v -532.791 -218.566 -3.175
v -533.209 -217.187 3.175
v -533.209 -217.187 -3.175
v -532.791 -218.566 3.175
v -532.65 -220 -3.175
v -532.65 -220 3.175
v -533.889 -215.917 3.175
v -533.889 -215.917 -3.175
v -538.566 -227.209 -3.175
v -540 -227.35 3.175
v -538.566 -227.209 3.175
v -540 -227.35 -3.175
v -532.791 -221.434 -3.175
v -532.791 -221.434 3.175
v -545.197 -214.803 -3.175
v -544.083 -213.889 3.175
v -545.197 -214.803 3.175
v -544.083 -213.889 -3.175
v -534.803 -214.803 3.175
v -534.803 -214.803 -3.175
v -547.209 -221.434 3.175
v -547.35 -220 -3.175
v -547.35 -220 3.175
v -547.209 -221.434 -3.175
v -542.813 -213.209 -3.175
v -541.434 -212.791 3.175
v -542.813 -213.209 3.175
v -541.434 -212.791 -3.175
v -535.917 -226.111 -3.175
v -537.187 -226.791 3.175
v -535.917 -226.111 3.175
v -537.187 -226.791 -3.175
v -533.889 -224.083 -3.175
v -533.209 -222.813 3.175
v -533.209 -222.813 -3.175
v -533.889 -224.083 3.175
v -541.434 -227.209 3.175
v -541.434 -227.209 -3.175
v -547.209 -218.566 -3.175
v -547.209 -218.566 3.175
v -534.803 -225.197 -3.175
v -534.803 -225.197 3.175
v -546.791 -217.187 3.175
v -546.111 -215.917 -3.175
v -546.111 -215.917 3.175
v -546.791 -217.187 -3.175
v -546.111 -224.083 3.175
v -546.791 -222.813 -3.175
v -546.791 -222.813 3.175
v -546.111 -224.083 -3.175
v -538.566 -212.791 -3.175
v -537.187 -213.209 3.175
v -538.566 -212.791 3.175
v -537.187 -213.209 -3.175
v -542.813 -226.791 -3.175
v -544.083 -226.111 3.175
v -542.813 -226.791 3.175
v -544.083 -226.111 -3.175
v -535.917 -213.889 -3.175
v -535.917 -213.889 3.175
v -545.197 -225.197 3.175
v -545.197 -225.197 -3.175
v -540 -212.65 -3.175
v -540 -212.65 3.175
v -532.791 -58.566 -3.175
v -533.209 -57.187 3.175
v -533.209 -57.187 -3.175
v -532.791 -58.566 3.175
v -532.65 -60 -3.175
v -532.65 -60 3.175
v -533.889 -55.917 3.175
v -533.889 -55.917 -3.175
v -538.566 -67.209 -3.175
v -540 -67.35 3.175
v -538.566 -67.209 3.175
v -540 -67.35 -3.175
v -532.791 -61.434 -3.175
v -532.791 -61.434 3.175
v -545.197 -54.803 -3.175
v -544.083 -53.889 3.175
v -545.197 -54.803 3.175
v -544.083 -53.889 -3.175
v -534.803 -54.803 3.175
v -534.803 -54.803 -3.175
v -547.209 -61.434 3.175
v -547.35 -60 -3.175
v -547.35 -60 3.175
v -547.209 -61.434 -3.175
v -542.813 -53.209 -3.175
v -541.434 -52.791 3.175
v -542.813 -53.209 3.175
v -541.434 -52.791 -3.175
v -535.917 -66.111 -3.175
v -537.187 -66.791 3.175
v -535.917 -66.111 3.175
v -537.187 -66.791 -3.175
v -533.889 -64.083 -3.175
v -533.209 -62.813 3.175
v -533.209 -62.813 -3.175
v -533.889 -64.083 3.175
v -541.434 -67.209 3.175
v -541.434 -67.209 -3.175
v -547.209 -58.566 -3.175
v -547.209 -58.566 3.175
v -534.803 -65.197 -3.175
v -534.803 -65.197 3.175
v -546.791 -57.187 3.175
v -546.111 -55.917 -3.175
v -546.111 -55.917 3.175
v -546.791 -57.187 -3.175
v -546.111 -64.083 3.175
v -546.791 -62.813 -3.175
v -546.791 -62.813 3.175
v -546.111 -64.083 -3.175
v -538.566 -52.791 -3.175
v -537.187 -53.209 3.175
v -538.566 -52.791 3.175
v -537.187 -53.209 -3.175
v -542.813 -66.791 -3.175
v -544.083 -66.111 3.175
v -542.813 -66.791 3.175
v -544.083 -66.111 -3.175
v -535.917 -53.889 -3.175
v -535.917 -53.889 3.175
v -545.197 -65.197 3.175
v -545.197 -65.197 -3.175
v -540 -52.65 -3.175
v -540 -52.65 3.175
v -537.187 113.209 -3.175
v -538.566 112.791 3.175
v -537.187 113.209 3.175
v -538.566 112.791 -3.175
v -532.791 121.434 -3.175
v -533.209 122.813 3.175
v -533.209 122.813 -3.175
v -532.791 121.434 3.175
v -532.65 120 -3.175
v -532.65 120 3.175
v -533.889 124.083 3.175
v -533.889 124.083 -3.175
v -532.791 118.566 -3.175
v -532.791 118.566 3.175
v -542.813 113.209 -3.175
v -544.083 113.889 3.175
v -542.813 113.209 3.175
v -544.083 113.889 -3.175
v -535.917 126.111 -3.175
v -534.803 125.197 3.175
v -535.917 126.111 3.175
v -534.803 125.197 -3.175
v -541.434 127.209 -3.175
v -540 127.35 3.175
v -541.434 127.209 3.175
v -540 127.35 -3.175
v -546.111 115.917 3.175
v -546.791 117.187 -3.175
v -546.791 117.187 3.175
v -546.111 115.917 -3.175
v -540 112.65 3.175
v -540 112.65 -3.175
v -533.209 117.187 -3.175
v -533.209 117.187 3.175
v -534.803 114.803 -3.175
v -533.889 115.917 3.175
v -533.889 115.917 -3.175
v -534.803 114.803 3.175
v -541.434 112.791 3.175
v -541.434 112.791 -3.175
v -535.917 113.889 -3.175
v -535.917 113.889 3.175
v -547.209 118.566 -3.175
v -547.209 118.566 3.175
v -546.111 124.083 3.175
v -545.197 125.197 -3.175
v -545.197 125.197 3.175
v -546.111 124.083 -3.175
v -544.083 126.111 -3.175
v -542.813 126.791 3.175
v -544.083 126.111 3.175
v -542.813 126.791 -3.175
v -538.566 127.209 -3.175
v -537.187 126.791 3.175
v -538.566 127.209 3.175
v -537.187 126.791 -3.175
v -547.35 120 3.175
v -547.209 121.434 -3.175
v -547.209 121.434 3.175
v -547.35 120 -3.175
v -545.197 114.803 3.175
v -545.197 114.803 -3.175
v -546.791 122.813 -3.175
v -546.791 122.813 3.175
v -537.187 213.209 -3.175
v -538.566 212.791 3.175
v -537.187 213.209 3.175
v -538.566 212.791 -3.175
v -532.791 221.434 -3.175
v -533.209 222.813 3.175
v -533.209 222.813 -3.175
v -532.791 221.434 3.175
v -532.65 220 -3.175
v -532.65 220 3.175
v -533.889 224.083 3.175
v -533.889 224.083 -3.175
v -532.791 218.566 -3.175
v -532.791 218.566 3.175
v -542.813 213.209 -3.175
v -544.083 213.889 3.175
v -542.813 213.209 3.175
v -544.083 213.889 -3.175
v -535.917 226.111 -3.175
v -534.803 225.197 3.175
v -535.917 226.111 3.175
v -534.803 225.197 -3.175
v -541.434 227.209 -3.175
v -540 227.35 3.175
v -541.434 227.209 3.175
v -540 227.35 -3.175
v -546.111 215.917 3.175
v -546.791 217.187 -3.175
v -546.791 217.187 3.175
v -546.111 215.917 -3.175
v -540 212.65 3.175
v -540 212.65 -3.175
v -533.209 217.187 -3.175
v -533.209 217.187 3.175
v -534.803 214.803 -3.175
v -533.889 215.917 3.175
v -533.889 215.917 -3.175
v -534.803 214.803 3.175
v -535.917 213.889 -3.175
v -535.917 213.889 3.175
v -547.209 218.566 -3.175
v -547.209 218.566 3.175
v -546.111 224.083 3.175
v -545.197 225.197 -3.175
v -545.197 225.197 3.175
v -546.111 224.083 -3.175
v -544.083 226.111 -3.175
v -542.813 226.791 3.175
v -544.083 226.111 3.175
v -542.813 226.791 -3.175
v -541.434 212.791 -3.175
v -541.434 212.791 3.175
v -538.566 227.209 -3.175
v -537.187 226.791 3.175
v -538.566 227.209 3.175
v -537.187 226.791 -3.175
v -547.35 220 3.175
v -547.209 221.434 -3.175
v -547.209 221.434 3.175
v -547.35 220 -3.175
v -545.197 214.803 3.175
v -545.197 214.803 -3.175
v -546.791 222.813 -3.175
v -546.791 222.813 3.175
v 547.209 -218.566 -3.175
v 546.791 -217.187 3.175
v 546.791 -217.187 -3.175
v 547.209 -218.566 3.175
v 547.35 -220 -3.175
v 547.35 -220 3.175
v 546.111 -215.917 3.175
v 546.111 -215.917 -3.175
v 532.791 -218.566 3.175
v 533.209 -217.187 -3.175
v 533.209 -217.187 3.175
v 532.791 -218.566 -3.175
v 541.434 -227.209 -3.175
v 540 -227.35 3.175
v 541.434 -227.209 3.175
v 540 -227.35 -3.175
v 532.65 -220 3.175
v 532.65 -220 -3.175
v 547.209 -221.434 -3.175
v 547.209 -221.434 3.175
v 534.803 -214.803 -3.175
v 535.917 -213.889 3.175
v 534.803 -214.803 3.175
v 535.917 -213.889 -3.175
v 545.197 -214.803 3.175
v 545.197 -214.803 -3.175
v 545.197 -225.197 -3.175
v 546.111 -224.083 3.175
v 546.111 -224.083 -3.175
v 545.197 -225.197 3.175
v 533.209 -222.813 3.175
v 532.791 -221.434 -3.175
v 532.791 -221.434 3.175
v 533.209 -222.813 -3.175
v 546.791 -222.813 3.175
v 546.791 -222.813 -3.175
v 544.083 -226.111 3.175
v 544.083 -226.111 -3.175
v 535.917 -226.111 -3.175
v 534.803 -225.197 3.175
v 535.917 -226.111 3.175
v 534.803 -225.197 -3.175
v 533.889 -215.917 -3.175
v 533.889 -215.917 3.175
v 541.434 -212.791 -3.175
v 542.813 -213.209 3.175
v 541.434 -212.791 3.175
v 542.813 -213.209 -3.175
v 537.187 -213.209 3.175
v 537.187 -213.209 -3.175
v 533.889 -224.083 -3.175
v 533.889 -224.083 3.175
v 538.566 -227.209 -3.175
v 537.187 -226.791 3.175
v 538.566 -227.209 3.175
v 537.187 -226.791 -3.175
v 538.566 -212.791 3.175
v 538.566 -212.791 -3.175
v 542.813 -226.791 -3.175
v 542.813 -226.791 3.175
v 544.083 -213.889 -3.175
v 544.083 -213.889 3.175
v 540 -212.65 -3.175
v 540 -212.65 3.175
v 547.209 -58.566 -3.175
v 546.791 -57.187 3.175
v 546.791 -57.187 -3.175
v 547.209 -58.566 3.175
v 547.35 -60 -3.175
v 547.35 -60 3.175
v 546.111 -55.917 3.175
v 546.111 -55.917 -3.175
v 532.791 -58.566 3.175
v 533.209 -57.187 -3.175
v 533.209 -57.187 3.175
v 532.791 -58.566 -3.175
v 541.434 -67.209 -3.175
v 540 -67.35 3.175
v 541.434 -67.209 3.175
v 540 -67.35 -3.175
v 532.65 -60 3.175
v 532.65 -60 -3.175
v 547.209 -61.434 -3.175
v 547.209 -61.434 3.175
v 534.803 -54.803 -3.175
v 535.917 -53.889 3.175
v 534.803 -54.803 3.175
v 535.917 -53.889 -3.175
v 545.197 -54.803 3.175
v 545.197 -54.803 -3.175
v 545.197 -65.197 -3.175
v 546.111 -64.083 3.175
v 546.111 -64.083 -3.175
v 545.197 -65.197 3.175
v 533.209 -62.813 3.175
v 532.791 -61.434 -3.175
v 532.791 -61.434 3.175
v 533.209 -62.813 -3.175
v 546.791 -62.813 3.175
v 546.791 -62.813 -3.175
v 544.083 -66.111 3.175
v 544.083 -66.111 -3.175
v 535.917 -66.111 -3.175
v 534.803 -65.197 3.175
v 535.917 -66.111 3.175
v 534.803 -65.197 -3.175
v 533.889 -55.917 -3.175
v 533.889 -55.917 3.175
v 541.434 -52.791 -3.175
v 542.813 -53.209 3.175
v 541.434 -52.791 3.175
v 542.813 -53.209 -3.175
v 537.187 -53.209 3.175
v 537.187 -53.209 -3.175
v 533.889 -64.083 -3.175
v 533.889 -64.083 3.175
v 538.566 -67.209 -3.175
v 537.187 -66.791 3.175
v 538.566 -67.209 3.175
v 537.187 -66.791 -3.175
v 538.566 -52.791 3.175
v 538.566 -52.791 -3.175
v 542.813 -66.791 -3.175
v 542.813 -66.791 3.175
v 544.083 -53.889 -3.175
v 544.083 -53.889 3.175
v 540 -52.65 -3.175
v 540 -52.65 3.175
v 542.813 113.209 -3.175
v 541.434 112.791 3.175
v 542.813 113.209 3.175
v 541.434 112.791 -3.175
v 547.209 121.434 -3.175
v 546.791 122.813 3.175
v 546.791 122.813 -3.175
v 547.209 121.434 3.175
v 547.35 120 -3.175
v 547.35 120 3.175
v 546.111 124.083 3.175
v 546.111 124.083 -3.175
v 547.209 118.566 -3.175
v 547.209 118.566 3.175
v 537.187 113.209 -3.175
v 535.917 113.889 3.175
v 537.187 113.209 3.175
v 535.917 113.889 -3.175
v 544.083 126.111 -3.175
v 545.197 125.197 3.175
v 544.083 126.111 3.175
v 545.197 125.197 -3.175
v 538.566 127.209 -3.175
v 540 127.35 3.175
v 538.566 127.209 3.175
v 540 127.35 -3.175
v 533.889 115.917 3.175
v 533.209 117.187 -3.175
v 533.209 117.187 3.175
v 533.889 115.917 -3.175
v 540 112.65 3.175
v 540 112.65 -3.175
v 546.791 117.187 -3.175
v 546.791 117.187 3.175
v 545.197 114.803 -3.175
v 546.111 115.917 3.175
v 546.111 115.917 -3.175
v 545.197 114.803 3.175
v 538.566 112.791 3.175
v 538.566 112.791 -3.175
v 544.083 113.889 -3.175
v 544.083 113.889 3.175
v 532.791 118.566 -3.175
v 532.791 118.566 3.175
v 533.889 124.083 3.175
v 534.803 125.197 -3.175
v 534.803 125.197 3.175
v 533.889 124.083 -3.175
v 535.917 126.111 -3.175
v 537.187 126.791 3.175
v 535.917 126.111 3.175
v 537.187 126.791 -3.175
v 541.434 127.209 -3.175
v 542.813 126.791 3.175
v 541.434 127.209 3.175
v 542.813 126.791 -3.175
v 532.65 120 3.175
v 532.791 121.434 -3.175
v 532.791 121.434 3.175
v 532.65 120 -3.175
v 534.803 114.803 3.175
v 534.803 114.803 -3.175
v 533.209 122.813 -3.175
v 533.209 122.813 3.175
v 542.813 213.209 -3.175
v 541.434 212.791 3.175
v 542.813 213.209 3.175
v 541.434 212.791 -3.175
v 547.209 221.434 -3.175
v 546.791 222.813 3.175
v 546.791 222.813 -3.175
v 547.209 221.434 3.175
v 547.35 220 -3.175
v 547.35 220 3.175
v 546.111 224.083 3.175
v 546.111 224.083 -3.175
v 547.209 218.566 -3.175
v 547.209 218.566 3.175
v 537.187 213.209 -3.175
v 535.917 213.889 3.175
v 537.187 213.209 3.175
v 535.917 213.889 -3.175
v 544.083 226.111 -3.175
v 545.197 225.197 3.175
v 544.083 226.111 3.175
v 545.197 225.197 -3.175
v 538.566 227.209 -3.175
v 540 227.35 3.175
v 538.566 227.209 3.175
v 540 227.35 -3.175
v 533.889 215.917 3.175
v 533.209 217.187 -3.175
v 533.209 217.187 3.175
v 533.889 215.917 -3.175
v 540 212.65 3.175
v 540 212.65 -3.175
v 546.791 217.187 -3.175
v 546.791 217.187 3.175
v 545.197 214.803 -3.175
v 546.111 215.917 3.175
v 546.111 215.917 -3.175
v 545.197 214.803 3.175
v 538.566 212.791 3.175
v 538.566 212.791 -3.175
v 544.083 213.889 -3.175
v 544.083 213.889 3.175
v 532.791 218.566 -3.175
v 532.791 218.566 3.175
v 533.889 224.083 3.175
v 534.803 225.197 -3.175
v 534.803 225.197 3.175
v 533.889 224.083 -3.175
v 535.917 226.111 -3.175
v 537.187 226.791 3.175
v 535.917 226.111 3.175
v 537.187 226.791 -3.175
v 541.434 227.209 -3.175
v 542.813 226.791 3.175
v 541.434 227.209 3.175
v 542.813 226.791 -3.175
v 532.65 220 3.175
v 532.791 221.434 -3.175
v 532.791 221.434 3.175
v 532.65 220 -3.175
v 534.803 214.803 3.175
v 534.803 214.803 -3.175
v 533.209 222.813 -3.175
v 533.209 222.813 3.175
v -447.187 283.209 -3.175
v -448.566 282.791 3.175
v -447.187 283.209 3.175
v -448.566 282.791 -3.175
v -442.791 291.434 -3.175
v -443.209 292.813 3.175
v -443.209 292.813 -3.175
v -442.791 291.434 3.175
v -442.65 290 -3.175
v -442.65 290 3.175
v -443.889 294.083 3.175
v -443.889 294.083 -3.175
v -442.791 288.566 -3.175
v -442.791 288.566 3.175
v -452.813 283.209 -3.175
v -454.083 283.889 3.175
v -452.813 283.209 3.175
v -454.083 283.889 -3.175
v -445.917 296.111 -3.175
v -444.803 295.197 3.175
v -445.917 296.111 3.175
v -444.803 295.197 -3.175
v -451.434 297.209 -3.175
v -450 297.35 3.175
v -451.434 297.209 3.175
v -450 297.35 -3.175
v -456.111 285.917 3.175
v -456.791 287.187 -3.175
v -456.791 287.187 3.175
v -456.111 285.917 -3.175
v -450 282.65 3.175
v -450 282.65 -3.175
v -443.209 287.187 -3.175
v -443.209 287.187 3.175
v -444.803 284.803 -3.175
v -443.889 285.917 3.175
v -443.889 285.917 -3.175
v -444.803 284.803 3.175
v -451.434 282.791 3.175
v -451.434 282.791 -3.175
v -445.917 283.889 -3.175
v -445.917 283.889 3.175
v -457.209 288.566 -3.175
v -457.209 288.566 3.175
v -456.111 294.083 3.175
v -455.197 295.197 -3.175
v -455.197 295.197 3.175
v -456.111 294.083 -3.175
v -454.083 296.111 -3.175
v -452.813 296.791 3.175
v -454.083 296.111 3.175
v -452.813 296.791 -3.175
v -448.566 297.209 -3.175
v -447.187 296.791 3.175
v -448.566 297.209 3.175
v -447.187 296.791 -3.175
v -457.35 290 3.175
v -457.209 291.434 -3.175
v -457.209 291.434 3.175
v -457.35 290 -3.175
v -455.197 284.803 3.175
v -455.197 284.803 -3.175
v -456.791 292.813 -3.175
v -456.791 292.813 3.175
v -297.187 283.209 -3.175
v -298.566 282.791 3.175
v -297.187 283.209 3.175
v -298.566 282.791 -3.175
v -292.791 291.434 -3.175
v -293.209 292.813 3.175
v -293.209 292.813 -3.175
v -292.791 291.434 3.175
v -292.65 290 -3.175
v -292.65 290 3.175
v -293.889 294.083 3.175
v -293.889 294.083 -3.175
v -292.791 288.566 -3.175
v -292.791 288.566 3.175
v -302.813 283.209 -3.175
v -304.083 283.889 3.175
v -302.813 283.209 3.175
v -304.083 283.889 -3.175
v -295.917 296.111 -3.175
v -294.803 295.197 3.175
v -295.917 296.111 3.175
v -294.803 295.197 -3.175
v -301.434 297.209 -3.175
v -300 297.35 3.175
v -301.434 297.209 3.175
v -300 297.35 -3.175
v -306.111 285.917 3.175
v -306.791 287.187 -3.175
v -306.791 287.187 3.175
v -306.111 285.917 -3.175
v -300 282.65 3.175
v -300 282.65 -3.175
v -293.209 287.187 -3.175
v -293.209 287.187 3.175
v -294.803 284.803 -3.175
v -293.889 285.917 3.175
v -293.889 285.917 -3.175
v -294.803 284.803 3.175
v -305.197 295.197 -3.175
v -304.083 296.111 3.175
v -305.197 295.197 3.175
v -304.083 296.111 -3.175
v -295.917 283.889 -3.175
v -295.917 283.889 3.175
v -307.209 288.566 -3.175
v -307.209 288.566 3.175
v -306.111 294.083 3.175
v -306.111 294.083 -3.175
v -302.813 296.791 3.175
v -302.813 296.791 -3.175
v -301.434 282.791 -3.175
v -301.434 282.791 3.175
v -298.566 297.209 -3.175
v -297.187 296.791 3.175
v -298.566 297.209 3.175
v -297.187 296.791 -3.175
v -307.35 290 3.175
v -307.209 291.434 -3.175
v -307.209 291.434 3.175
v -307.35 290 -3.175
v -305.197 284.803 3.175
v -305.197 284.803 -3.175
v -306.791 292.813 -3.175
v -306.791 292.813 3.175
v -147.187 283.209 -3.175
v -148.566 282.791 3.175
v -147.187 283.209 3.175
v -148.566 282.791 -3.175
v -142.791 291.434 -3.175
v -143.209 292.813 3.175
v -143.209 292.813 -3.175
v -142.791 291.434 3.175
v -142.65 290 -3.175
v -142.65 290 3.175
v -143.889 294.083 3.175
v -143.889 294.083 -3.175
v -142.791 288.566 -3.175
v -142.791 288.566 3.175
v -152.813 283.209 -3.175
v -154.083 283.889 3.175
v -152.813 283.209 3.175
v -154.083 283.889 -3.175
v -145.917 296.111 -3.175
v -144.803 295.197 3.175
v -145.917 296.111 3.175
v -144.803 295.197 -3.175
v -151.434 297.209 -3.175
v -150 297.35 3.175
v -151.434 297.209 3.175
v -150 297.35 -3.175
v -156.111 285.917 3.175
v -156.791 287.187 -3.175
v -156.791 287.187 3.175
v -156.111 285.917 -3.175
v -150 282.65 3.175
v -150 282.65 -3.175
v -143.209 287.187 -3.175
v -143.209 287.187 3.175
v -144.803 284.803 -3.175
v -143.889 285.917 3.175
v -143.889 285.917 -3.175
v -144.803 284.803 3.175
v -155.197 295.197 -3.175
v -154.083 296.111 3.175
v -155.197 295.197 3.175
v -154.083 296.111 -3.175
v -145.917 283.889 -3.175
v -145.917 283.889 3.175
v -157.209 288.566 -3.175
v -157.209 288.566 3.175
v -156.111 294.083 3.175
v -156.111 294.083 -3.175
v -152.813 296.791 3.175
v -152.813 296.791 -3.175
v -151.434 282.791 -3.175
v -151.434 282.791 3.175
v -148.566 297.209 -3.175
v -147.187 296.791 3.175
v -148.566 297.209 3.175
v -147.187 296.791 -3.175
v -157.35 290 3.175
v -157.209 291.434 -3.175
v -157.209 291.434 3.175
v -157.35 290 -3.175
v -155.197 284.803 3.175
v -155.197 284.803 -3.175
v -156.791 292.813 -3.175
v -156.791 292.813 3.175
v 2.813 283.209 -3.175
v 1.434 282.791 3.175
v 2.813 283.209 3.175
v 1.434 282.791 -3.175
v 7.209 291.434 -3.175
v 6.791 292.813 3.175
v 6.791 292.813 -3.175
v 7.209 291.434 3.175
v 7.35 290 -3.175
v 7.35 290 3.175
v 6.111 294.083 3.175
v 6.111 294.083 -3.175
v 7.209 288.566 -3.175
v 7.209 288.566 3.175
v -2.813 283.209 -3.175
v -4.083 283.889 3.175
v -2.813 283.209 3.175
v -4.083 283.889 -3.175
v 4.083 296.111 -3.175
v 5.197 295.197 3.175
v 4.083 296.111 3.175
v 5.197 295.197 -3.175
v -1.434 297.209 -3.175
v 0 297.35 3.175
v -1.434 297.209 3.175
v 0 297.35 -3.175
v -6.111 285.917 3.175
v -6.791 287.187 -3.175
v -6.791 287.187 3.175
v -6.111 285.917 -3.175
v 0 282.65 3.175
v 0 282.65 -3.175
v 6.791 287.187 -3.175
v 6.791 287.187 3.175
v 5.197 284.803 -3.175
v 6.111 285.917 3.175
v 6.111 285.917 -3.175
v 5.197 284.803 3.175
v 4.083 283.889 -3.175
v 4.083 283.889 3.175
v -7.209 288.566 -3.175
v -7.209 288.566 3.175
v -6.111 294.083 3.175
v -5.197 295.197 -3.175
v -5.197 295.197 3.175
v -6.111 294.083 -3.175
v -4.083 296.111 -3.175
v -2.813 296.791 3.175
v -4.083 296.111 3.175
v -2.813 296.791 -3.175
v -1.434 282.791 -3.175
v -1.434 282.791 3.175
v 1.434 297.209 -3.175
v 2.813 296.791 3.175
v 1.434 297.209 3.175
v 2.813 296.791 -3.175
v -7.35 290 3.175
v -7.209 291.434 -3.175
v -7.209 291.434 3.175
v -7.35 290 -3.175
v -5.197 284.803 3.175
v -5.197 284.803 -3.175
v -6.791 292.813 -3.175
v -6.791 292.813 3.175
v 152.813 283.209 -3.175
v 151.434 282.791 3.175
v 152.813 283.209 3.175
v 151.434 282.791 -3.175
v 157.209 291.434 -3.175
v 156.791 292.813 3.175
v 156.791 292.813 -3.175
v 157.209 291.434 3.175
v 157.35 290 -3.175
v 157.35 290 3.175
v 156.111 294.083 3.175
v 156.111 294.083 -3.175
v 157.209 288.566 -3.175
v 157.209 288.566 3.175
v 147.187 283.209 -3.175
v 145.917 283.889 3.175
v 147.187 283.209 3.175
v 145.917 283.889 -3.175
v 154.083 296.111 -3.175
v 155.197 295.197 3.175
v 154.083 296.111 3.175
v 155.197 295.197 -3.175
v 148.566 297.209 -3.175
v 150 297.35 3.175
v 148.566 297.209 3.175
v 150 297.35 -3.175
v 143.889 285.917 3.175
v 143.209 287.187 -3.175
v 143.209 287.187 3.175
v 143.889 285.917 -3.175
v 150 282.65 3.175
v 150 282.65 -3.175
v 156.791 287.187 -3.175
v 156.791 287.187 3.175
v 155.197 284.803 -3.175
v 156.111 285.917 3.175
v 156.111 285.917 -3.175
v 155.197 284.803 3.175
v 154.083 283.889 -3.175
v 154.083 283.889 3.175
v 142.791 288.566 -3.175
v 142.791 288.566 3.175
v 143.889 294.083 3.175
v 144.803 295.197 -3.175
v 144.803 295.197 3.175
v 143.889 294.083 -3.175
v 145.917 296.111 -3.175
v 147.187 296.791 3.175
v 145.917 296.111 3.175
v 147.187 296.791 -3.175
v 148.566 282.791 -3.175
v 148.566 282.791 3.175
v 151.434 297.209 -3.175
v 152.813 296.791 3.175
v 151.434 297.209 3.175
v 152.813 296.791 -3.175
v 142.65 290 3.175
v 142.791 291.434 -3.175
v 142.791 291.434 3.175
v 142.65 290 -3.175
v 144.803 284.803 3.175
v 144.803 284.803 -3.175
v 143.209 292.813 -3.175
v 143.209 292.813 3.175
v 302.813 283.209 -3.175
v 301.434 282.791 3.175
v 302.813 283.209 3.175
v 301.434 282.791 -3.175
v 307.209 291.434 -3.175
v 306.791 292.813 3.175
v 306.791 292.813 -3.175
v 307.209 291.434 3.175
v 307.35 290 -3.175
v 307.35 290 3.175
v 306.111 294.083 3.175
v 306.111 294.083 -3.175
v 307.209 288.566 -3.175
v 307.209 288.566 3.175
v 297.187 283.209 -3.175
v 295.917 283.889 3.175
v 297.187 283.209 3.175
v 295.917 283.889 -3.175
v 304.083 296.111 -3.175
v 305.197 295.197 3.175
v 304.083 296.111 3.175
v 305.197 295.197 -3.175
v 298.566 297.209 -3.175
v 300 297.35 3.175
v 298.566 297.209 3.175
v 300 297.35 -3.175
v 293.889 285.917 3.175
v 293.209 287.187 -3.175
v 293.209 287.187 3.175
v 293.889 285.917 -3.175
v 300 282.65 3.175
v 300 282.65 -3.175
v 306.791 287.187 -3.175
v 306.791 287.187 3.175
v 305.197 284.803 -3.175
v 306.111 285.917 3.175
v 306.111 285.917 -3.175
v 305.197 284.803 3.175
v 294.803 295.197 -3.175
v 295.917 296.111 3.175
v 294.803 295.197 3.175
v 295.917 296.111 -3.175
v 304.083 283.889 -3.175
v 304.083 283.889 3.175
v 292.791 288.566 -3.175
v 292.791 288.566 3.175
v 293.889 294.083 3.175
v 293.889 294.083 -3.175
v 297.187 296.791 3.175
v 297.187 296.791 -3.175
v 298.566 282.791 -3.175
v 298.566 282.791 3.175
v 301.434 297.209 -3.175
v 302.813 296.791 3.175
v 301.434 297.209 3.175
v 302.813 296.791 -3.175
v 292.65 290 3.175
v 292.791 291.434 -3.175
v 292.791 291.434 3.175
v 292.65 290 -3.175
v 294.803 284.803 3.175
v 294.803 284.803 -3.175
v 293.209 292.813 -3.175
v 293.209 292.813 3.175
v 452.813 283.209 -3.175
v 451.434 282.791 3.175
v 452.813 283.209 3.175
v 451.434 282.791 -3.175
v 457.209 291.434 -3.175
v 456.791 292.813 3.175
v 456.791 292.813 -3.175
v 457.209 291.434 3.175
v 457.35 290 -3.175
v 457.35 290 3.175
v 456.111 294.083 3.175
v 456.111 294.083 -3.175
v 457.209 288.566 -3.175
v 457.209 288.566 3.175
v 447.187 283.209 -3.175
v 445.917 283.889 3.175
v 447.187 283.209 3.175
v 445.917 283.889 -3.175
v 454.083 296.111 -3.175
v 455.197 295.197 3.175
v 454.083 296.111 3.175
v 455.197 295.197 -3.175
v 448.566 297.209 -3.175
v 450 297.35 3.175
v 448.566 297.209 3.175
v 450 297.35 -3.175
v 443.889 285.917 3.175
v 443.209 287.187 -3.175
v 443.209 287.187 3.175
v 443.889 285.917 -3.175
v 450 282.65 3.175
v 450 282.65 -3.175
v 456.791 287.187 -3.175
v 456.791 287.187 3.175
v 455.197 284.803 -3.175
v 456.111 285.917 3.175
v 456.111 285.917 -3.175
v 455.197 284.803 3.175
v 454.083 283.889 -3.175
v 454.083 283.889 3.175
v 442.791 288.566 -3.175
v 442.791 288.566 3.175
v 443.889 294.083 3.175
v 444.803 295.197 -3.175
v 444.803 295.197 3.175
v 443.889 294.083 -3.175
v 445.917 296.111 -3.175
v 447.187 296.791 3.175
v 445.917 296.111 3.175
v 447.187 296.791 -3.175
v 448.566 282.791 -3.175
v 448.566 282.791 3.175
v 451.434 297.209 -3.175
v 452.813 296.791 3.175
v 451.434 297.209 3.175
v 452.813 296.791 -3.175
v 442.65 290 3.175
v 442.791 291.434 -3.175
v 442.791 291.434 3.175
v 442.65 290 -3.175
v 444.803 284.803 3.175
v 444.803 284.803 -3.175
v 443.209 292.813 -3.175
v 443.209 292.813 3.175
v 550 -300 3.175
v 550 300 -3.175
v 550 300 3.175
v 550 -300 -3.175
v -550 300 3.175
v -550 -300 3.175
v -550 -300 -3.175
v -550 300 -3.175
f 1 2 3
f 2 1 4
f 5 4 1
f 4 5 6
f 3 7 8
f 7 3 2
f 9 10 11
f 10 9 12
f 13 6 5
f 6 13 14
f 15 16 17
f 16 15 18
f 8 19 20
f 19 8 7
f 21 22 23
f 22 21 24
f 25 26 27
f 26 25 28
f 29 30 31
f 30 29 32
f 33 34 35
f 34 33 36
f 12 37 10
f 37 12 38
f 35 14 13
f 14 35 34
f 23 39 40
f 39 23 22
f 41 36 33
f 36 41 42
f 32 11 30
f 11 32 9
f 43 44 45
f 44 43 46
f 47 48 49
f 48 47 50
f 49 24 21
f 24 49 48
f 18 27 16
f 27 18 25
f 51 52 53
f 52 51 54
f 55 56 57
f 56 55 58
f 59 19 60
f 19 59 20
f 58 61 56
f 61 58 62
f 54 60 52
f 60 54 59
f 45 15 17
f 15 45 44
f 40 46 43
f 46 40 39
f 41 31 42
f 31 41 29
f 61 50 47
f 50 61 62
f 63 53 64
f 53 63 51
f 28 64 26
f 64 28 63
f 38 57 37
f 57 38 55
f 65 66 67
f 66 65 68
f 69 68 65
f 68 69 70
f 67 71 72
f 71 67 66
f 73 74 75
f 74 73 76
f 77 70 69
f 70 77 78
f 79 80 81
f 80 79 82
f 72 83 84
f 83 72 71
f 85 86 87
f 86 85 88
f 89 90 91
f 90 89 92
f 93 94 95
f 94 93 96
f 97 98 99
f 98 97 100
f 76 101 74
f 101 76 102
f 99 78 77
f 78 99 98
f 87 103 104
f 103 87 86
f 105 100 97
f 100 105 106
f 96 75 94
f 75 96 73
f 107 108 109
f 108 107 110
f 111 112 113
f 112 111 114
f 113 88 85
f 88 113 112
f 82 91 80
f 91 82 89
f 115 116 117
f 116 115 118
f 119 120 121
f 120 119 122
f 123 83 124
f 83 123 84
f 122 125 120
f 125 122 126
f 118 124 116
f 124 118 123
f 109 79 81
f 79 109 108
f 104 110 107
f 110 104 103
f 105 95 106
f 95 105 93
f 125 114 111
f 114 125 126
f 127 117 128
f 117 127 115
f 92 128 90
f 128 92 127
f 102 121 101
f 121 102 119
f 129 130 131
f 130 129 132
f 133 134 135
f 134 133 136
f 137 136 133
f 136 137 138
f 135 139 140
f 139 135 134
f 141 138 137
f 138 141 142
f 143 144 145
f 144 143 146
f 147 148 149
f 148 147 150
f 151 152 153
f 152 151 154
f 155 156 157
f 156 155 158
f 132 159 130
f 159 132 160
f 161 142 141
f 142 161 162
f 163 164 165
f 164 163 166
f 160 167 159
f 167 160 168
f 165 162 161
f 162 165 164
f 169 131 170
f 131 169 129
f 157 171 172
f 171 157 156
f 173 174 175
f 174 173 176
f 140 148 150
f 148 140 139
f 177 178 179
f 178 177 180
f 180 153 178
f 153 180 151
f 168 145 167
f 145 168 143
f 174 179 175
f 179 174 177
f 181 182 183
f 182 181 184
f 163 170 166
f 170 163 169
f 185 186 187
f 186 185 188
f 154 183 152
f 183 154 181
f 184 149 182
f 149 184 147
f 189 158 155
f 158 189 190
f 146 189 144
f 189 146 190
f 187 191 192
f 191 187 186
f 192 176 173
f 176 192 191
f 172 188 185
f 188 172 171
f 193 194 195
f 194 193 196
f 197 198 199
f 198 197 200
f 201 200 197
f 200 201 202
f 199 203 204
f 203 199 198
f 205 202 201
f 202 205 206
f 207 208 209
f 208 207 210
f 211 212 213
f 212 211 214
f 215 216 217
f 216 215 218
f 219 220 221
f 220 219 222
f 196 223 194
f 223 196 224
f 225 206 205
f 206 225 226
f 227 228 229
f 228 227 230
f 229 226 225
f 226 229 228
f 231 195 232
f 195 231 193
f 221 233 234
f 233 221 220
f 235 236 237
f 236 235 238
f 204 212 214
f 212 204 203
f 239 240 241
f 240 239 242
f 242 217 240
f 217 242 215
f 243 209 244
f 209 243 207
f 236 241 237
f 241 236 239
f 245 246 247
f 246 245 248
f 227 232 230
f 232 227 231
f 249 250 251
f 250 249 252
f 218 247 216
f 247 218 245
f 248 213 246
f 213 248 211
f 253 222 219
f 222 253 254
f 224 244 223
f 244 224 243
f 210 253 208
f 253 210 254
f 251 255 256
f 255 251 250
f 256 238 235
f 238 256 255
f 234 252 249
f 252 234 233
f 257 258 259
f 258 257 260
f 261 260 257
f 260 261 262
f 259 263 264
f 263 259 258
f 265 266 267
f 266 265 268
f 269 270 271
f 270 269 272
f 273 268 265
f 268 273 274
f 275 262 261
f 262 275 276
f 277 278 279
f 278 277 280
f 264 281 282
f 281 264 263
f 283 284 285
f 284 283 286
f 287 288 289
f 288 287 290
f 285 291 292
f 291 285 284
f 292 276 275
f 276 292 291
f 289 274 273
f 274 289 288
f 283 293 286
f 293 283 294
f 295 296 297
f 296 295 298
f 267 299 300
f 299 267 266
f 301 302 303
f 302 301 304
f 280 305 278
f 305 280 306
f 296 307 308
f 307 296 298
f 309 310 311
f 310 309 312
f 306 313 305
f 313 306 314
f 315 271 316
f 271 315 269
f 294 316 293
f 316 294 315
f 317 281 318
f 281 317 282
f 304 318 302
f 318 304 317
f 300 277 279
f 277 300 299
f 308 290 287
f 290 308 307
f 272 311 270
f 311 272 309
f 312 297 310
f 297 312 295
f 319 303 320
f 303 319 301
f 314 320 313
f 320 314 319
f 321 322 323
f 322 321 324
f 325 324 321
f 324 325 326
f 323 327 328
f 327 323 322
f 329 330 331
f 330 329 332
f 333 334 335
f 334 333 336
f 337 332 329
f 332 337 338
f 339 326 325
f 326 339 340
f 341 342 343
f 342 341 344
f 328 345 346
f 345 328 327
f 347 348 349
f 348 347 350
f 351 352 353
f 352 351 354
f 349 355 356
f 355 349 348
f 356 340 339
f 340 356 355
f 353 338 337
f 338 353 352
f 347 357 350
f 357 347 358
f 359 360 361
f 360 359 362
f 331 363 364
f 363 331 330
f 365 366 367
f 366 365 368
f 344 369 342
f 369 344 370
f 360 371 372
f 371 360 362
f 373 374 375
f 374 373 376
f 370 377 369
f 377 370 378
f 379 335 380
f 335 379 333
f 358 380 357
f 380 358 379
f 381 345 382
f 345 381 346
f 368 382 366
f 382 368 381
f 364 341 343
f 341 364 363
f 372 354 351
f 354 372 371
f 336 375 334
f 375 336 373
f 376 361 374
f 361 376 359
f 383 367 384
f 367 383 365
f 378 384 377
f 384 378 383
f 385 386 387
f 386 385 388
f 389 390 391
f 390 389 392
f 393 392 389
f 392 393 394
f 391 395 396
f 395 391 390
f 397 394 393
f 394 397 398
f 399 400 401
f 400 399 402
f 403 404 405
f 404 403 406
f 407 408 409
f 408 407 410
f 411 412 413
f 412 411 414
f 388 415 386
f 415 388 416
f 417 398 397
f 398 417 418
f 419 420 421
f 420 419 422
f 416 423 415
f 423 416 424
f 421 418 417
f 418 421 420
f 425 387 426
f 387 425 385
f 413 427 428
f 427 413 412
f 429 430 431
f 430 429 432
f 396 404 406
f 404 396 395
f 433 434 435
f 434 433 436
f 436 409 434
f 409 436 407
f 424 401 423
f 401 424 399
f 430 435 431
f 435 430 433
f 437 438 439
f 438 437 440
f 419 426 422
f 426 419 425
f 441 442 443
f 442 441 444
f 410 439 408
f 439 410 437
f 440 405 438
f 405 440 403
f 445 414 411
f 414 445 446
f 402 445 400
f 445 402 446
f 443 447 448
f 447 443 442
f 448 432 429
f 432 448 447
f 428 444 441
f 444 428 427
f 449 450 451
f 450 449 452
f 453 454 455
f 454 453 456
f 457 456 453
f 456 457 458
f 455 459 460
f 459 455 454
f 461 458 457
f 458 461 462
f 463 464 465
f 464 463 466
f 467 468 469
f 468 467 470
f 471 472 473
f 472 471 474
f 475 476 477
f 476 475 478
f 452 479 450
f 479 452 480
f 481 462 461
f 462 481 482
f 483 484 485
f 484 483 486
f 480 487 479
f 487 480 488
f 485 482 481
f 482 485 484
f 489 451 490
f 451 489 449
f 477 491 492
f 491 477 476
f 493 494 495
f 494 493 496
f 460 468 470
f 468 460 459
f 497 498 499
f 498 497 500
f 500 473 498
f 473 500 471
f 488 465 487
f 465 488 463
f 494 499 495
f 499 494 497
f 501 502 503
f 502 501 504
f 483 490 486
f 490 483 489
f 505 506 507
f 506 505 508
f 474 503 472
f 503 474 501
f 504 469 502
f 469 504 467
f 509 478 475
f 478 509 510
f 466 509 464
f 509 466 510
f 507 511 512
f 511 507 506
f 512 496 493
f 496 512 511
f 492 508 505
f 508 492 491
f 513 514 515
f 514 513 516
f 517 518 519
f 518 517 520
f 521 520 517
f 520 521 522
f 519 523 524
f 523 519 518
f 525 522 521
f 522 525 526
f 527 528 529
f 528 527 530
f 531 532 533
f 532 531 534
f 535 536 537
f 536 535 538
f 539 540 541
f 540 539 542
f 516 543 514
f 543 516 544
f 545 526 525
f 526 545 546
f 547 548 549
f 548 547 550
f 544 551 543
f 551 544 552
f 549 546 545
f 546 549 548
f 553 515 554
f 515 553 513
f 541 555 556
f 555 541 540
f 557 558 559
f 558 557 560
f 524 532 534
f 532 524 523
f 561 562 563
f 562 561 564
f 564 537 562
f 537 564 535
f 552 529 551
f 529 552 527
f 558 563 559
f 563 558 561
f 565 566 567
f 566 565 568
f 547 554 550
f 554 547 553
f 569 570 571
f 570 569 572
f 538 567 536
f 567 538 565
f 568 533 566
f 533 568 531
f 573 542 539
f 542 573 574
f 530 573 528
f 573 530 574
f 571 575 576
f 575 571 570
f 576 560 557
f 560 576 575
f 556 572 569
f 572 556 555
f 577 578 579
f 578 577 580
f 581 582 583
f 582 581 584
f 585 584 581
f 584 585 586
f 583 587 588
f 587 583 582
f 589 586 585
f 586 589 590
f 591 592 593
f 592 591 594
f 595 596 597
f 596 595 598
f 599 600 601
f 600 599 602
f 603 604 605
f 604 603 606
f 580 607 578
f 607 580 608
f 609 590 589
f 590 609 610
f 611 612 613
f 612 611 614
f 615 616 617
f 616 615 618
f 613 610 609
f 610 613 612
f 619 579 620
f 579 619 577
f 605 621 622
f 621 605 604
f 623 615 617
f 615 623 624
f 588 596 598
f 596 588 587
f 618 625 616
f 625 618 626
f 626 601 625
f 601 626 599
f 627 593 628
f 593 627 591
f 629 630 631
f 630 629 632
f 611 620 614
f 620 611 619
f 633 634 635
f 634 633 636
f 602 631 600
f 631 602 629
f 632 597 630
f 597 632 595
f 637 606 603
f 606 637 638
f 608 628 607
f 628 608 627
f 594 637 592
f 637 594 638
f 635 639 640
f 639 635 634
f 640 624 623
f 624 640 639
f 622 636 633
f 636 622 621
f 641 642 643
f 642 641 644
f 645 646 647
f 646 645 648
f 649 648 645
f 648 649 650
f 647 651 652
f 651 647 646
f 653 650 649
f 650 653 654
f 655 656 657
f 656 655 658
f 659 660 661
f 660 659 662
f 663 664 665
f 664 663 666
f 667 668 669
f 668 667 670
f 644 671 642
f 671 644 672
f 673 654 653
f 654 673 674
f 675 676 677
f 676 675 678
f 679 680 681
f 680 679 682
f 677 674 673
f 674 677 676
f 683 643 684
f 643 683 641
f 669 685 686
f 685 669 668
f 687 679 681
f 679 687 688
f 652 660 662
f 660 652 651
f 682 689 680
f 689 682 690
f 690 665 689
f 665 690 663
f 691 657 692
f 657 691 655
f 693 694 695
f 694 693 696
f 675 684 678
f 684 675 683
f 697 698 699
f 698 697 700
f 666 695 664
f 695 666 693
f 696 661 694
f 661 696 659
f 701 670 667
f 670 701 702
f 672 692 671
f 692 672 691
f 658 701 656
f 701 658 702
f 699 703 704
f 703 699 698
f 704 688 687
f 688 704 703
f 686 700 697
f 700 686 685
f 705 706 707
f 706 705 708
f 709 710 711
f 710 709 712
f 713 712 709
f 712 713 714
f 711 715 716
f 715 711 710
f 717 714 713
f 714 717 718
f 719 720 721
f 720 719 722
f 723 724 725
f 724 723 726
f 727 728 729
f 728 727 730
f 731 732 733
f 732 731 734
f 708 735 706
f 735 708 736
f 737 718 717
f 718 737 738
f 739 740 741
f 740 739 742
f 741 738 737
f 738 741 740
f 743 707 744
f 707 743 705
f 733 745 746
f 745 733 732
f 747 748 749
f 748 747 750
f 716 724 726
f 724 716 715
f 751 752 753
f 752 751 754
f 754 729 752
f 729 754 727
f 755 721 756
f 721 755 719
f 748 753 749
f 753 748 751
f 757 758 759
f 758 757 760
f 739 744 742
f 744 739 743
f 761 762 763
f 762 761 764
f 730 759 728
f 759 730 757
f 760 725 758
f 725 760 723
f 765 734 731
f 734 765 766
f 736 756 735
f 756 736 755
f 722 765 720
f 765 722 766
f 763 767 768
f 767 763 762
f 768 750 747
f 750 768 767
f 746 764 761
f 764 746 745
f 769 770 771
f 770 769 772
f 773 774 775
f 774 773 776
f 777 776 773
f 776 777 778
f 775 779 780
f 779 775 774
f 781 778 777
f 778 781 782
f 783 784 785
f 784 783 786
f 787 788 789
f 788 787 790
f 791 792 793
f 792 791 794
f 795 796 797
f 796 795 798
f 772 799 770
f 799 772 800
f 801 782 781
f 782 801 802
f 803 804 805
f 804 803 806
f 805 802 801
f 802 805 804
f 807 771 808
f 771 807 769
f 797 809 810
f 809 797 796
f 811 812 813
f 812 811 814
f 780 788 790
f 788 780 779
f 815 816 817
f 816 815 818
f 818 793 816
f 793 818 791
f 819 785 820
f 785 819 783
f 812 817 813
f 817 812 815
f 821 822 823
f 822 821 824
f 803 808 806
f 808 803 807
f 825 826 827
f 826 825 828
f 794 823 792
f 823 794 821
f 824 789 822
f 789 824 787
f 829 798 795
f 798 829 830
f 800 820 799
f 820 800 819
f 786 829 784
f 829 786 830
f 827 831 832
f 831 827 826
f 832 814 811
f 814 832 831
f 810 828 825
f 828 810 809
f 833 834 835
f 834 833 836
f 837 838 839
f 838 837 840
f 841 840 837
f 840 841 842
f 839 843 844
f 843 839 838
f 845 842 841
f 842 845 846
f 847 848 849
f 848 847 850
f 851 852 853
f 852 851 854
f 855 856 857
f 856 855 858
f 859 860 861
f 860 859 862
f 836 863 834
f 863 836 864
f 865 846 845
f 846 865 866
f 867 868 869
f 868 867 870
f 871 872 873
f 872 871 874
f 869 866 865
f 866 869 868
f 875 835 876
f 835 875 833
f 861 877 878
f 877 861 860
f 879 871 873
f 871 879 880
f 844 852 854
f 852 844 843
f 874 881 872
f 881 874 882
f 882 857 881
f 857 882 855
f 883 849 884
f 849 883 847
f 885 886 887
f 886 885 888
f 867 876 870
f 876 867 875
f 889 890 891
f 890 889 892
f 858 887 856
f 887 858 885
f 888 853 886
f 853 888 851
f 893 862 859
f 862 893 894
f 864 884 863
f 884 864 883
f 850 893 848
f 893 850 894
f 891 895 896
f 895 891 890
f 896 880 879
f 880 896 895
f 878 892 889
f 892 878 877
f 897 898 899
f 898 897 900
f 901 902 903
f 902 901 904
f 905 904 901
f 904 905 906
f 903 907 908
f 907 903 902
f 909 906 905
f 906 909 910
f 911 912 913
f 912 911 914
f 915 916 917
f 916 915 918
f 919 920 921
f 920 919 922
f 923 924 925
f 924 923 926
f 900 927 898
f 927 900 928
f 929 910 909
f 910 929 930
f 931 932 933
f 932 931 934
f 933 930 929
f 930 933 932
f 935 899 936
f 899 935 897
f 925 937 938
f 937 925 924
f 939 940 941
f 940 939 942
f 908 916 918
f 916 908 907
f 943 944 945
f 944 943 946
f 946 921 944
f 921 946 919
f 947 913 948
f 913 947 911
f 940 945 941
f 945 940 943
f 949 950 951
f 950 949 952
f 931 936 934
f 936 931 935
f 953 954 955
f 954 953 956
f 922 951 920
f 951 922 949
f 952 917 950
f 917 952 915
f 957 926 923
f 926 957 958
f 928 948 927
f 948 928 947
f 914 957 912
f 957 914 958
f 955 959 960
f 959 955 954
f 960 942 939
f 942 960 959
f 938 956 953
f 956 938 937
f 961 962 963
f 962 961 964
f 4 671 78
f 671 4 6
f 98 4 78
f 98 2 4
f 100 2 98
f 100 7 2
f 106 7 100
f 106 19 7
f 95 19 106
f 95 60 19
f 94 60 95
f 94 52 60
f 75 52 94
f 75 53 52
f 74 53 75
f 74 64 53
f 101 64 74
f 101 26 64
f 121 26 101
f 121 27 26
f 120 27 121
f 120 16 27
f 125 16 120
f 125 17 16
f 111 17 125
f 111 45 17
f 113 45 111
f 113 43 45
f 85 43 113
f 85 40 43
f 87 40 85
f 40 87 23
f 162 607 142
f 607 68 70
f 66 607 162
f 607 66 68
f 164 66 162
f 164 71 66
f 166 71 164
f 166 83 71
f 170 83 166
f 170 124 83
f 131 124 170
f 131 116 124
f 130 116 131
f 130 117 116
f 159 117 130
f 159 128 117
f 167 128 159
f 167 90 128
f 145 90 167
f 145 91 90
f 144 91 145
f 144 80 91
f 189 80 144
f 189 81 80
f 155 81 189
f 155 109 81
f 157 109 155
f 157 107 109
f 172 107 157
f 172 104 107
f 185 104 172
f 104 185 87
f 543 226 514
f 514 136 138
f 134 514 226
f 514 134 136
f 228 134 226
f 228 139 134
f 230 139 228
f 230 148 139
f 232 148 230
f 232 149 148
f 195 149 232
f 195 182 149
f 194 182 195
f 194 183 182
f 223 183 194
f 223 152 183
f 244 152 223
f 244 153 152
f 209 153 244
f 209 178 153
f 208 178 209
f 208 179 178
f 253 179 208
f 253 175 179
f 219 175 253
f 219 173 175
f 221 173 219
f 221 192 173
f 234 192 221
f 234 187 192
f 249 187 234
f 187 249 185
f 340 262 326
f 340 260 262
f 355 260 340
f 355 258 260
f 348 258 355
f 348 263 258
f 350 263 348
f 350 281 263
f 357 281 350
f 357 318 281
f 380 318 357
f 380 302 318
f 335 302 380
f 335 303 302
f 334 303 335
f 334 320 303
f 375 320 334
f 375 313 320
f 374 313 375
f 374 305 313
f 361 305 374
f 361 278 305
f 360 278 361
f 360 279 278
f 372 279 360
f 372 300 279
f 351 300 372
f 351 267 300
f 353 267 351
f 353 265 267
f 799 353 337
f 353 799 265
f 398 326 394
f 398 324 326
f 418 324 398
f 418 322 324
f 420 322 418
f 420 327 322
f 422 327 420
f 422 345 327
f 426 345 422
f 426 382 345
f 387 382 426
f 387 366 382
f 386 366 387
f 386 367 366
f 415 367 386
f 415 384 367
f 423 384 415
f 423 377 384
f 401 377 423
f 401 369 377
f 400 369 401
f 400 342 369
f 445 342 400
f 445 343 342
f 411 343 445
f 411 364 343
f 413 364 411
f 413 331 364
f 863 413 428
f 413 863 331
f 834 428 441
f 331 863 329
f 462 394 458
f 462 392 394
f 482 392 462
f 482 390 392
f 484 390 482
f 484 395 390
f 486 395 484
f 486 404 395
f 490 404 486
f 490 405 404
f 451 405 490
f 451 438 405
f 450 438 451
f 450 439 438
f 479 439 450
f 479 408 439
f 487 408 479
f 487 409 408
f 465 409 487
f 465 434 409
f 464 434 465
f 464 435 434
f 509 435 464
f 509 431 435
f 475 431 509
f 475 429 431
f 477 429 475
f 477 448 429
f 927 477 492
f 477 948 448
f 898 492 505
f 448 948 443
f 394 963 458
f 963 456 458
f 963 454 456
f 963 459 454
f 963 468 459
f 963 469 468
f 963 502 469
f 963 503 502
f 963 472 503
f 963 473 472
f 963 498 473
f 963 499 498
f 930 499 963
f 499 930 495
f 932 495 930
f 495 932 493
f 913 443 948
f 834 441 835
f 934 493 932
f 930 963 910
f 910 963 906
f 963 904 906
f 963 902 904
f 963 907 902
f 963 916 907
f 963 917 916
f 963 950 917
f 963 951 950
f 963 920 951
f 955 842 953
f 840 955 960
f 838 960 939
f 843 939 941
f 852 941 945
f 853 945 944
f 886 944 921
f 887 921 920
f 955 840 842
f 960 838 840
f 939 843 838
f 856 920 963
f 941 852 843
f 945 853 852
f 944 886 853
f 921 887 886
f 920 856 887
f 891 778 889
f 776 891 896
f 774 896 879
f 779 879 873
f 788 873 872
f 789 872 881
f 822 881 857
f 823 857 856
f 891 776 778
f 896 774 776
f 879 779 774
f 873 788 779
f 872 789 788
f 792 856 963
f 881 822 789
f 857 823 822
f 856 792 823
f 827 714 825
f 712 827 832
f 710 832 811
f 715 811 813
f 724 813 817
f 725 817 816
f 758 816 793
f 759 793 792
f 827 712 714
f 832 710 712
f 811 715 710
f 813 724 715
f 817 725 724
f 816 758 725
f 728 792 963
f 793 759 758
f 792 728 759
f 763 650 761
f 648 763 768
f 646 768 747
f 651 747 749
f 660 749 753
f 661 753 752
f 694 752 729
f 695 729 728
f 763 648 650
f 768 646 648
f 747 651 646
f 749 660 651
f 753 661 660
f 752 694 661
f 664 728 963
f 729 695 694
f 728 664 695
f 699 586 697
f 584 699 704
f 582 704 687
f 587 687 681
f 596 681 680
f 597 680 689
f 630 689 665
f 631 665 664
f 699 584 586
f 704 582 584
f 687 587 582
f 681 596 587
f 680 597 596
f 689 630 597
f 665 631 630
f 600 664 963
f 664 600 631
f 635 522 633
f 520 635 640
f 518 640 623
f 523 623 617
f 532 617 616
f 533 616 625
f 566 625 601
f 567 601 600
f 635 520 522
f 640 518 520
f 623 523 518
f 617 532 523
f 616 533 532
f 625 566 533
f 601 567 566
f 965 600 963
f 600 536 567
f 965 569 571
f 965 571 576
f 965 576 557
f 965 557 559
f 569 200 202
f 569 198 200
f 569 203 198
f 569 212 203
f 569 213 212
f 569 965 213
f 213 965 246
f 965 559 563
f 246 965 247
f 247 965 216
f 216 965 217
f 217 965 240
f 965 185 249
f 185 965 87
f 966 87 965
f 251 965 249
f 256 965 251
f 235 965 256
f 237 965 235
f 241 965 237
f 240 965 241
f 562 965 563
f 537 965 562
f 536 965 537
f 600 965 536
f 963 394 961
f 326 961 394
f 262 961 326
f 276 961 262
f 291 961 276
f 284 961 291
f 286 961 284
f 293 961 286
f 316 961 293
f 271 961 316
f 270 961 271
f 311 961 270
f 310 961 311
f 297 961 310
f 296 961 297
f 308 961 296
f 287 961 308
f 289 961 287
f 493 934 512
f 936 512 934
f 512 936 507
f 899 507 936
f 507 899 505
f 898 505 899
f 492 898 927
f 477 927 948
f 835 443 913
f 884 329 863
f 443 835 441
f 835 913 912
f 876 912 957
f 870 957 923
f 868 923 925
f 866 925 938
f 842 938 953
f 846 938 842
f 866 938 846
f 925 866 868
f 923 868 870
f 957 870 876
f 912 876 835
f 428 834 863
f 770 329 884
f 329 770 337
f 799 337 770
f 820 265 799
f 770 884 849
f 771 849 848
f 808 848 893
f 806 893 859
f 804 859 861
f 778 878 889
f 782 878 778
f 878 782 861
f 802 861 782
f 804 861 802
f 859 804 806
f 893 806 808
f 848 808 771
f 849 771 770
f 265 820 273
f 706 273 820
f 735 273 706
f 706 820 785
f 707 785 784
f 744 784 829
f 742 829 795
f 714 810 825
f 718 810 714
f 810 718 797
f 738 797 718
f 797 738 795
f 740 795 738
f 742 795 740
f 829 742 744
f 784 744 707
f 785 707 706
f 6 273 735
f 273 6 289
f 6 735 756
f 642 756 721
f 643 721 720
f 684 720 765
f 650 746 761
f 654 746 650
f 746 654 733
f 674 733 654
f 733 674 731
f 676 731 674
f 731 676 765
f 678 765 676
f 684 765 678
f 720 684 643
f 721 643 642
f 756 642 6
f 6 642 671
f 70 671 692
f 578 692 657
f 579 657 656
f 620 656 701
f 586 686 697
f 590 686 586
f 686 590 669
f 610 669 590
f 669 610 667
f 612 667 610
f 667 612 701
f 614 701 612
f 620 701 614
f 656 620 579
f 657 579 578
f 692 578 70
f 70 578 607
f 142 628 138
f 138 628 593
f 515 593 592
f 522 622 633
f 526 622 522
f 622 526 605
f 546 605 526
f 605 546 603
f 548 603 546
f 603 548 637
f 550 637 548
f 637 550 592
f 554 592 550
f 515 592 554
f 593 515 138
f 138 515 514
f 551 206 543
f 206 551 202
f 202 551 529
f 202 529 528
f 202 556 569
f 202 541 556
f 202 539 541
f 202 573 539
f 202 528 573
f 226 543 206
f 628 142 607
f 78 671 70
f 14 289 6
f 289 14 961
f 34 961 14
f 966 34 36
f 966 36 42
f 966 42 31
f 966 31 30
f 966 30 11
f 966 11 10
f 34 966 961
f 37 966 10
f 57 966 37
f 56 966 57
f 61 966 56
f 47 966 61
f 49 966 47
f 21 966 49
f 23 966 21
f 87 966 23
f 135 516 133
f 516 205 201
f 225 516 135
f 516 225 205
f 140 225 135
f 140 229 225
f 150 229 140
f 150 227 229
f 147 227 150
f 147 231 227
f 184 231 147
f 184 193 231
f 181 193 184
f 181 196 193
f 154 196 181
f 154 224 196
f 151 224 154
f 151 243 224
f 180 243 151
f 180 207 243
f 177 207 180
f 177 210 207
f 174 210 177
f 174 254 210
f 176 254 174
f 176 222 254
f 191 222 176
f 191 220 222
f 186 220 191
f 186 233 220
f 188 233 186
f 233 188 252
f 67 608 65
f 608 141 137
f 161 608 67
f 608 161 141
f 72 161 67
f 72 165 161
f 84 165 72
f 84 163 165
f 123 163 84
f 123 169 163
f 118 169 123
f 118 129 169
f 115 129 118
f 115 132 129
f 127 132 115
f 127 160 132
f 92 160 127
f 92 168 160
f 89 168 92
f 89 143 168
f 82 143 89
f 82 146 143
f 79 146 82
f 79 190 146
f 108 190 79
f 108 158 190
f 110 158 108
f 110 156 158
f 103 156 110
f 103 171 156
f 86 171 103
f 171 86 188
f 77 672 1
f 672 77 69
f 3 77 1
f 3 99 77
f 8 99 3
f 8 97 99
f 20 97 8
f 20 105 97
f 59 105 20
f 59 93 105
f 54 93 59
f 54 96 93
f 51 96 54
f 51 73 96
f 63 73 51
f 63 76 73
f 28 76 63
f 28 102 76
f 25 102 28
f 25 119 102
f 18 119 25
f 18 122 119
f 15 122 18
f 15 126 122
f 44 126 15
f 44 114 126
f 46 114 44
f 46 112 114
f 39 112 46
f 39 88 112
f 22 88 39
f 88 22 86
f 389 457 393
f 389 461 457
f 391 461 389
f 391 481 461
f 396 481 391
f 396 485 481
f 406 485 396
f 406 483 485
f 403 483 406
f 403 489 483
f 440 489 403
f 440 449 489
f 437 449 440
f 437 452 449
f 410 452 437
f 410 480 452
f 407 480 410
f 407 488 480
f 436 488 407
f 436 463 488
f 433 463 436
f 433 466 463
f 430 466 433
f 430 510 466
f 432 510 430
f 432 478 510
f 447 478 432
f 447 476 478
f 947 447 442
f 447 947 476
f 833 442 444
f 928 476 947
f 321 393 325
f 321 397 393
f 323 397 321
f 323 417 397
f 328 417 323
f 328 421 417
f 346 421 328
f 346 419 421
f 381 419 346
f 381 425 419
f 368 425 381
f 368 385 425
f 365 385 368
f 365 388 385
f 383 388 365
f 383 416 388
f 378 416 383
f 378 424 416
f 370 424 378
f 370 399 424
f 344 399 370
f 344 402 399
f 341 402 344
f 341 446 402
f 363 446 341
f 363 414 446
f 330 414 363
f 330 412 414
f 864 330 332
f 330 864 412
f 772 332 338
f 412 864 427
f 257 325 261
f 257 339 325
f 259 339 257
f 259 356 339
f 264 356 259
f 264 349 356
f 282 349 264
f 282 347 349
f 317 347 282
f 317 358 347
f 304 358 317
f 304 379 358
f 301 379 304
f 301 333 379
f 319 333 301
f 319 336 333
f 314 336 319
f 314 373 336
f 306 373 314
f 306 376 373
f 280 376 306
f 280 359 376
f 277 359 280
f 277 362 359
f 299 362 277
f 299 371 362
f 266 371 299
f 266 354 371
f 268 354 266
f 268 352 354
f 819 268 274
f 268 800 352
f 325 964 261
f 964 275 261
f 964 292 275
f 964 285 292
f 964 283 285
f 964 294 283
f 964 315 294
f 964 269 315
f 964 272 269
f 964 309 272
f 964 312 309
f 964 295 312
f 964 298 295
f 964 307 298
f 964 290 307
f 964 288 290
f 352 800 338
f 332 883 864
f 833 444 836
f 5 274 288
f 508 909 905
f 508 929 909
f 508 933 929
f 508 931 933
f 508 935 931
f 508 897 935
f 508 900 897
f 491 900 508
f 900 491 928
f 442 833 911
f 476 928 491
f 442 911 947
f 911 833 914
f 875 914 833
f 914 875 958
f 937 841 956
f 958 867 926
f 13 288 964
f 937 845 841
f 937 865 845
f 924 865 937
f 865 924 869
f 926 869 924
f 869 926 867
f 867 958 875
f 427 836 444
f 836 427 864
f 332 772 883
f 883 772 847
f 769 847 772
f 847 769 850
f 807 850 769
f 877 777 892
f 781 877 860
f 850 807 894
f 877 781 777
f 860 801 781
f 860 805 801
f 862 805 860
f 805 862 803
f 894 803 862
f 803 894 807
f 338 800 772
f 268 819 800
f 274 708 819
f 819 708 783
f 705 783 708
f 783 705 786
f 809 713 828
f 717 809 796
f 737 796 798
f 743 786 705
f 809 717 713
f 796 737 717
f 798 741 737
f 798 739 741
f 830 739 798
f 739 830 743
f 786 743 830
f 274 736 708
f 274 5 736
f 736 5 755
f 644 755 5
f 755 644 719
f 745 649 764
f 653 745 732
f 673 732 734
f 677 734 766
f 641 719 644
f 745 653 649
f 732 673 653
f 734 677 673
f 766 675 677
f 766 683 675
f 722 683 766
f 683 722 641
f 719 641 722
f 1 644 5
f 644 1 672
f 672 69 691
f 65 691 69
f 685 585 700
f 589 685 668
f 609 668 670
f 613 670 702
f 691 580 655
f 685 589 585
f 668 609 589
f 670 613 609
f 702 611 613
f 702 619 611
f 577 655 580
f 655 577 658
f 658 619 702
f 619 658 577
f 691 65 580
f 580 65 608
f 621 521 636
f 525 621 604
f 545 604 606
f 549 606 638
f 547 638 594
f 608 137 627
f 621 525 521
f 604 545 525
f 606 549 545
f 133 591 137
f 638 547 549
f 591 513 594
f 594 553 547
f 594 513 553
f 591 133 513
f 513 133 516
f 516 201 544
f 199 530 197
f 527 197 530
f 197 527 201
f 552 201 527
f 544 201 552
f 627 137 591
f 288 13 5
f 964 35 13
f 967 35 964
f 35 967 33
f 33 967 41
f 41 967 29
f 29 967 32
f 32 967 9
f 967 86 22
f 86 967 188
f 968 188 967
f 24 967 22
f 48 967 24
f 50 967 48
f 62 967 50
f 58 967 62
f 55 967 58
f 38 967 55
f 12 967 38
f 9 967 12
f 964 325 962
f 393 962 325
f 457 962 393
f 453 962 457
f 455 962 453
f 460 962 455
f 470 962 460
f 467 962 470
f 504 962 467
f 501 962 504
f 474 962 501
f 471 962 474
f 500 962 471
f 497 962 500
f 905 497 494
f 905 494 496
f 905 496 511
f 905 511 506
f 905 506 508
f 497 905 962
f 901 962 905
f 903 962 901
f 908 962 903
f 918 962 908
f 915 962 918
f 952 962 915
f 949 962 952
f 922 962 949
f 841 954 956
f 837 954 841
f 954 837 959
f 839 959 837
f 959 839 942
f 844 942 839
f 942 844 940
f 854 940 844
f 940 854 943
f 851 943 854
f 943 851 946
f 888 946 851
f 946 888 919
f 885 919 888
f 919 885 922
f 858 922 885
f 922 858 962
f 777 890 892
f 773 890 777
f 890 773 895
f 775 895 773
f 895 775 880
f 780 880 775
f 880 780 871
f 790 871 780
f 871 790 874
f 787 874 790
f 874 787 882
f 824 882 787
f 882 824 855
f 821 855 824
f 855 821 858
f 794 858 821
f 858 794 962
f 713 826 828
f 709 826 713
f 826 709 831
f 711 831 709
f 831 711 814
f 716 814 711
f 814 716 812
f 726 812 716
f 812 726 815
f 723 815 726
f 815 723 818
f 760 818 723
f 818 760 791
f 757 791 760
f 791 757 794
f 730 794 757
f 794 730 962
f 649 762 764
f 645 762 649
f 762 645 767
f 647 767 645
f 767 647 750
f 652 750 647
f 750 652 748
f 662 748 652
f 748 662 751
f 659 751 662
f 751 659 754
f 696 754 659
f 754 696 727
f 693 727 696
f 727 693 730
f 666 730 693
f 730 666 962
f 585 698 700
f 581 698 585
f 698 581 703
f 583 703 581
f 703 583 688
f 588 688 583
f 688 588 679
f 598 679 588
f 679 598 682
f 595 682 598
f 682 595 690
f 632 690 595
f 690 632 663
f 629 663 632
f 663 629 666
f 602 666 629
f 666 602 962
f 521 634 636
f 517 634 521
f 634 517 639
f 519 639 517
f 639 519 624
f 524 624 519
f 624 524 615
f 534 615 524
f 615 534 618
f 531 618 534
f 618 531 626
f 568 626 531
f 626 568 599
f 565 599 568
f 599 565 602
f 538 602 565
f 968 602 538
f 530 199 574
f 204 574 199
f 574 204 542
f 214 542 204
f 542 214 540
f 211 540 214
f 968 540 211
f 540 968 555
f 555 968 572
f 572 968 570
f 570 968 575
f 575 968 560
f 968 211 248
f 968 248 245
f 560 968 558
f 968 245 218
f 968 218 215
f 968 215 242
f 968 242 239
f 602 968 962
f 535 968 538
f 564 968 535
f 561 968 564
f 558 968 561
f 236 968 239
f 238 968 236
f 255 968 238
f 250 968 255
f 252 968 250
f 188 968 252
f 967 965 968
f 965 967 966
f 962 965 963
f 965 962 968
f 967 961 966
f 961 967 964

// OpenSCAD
// bucket_bottom.scad
// Bucket bottom plate for LifeTrac v25
// CNC cut from 1/4" plate steel

include <../openscad/lifetrac_v25_params.scad>

module bucket_bottom() {
    difference() {
        // Main plate
        cube([BUCKET_WIDTH, BUCKET_DEPTH, PLATE_1_4_INCH], center=true);
        
        // Edge mounting holes for sides (4 per side)
        for (side = [-1, 1]) {
            x_pos = side * (BUCKET_WIDTH/2 - 10);
            for (y = [-BUCKET_DEPTH/2+80, -BUCKET_DEPTH/2+BUCKET_DEPTH*0.4, -BUCKET_DEPTH/2+BUCKET_DEPTH*0.7, BUCKET_DEPTH/2-80]) {
                translate([x_pos, y, 0])
                cylinder(d=BOLT_DIA_1_2 + 2, h=PLATE_1_4_INCH+4, center=true, $fn=32);
            }
        }
        
        // Back edge mounting holes for quick attach
        for (x = [-BUCKET_WIDTH/2+100 : 150 : BUCKET_WIDTH/2-100]) {
            translate([x, BUCKET_DEPTH/2-10, 0])
            cylinder(d=BOLT_DIA_1_2 + 2, h=PLATE_1_4_INCH+4, center=true, $fn=32);
        }
    }
}

// Render the part for preview/export
if ($preview || len(search("bucket_bottom.scad", parent_modules())) == 0) {
    bucket_bottom();
}
